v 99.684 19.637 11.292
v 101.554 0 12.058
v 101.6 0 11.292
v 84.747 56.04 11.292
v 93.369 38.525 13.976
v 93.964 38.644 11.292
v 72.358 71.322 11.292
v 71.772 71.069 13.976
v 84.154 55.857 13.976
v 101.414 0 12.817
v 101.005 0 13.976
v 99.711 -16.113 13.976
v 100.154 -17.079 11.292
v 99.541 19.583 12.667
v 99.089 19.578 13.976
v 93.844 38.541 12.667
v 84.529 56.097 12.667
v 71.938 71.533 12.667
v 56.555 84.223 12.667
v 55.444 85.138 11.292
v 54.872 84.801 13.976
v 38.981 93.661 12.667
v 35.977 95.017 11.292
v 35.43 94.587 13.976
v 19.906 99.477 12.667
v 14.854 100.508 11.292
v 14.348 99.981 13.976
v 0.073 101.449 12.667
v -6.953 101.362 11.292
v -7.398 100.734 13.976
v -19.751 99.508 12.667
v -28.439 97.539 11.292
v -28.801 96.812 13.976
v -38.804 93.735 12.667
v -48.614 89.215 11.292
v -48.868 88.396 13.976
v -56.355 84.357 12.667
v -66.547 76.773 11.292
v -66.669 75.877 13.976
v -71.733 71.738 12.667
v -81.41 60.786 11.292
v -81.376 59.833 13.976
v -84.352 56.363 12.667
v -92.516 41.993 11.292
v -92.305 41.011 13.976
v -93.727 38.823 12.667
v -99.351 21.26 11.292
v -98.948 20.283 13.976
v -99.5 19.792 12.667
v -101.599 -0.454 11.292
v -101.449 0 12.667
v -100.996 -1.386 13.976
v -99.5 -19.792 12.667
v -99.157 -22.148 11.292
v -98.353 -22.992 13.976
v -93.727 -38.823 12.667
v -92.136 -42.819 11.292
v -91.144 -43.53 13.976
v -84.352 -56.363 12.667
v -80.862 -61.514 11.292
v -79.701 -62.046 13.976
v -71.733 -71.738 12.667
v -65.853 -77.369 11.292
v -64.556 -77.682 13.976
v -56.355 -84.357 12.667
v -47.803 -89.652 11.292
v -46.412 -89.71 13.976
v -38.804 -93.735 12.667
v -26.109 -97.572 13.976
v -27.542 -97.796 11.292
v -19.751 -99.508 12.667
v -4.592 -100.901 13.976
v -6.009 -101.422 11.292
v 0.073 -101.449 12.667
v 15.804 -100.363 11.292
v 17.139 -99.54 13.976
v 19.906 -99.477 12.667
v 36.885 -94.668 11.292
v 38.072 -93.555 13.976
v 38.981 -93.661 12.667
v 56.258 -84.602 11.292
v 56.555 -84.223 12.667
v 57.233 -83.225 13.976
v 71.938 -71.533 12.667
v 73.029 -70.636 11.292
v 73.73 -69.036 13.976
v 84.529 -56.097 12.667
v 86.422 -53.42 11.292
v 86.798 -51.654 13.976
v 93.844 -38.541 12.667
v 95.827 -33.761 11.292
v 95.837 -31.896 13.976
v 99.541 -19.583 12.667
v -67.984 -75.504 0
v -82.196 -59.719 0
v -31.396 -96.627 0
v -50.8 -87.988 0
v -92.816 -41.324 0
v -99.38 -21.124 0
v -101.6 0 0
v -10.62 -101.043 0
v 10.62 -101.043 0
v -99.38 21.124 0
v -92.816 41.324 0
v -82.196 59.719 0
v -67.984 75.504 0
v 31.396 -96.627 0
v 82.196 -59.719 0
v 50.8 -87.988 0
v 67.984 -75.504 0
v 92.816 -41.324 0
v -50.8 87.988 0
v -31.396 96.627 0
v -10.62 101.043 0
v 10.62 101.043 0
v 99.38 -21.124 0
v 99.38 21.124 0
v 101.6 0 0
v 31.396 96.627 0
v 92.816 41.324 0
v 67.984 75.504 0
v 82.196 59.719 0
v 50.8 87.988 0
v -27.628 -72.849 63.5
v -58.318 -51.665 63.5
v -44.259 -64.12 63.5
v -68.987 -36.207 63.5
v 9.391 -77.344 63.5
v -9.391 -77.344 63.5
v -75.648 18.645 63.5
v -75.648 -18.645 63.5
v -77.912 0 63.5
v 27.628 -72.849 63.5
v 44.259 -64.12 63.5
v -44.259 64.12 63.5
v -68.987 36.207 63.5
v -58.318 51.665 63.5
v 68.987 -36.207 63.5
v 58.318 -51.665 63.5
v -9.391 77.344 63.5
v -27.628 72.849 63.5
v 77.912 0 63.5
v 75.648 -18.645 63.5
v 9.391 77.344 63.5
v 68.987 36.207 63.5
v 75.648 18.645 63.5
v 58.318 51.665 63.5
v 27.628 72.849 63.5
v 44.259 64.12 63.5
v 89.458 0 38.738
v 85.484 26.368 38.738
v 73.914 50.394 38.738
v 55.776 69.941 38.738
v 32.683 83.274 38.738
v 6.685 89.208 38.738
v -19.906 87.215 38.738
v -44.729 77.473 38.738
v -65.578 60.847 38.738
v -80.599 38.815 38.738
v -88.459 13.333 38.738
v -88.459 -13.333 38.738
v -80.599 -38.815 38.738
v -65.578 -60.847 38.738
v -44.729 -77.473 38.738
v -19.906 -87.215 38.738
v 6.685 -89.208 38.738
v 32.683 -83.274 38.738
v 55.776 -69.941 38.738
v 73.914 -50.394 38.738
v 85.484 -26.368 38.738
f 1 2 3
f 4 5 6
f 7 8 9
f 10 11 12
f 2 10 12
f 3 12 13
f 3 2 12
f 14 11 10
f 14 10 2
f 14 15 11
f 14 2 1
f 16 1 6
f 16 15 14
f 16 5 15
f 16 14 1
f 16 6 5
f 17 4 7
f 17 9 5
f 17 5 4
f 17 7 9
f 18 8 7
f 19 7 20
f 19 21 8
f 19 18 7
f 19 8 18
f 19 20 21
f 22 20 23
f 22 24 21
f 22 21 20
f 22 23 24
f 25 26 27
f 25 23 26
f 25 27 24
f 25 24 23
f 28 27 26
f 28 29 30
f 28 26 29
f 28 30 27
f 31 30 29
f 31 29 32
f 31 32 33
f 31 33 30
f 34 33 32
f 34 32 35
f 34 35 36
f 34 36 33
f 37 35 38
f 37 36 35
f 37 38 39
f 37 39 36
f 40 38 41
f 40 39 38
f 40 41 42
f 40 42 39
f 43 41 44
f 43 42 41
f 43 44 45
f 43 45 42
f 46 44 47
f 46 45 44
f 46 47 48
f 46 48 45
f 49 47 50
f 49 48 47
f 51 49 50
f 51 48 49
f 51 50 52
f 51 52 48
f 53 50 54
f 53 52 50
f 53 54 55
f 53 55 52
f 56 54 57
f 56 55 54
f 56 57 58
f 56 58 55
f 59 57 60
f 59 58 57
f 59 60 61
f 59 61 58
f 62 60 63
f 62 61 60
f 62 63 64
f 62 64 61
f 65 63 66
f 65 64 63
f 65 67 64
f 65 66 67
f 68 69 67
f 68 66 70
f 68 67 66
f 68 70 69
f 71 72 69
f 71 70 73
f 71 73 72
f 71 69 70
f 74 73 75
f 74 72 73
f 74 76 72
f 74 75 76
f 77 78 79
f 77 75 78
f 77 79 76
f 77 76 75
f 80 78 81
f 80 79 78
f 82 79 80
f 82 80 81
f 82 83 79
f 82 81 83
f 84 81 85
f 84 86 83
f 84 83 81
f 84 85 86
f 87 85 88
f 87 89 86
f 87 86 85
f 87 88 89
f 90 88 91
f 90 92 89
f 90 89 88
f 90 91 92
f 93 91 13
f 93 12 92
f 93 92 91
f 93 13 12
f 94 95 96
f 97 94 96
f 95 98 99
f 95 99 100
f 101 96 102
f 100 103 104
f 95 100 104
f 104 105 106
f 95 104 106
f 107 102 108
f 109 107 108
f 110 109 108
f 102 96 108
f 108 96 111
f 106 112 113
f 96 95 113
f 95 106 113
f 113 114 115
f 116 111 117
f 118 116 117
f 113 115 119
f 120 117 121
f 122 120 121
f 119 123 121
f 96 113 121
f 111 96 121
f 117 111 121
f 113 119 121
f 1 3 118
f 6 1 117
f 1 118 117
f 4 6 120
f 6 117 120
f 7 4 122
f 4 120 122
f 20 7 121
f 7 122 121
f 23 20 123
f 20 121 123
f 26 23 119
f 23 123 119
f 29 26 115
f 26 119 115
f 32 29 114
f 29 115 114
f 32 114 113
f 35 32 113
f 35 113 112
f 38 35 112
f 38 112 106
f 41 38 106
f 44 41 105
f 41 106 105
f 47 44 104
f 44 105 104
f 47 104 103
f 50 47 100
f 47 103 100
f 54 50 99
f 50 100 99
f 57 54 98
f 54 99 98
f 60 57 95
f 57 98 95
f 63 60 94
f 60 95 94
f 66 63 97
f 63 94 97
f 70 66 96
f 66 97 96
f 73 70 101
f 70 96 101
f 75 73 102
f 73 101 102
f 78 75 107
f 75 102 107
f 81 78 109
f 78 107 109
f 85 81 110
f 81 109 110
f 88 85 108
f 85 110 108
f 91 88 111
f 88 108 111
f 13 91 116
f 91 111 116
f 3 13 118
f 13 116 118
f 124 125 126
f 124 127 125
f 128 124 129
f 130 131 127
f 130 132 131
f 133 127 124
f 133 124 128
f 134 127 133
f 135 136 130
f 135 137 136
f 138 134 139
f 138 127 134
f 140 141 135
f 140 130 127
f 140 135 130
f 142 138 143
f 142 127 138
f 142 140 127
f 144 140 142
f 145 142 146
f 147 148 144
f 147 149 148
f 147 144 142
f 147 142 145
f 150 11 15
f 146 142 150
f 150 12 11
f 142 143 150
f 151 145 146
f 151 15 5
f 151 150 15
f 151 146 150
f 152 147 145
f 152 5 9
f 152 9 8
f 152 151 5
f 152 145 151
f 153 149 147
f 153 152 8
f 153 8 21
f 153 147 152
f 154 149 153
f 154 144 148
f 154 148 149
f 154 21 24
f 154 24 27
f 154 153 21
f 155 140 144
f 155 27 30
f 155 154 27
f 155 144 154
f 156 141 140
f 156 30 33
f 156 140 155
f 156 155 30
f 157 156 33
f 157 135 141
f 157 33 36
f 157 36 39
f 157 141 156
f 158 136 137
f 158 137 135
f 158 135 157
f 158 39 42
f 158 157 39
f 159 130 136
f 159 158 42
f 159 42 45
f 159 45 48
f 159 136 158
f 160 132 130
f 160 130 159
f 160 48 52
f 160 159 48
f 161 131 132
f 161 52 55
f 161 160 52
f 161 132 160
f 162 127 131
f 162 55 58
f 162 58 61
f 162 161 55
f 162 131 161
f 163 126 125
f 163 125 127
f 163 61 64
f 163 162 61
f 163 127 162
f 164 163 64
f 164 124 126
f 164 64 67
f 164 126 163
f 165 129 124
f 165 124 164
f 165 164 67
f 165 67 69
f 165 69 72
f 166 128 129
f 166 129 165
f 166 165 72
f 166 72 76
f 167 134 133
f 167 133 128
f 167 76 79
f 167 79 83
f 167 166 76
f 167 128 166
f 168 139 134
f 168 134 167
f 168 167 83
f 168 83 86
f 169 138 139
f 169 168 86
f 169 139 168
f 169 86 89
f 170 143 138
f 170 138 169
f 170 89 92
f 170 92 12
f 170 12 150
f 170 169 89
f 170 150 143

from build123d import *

# Parameters (mm, degrees)
F0_R      = 101.6
F1_DEPTH  = 12.7
F1_FACE_R = 101.6
F2_DEPTH  = 50.8
F2_TAPER  = 25
F3_R      = 6.35


with BuildPart() as f1:
    # F0 (on Top) → F1 (new body)
    with BuildSketch(Plane.XY):
        Circle(F0_R)
    extrude(amount=F1_DEPTH)

    # F1_face (on face) → F2 (join)
    with BuildSketch(Plane.XY.offset(12.7)):
        Circle(F1_FACE_R)
    extrude(amount=F2_DEPTH, taper=F2_TAPER)

    # F3
    f3_edges = [f1.edges().sort_by_distance(p)[0] for p in [
        (-101.6, 0, 12.7),
    ]]
    fillet(f3_edges, radius=F3_R)


solid = f1.part
